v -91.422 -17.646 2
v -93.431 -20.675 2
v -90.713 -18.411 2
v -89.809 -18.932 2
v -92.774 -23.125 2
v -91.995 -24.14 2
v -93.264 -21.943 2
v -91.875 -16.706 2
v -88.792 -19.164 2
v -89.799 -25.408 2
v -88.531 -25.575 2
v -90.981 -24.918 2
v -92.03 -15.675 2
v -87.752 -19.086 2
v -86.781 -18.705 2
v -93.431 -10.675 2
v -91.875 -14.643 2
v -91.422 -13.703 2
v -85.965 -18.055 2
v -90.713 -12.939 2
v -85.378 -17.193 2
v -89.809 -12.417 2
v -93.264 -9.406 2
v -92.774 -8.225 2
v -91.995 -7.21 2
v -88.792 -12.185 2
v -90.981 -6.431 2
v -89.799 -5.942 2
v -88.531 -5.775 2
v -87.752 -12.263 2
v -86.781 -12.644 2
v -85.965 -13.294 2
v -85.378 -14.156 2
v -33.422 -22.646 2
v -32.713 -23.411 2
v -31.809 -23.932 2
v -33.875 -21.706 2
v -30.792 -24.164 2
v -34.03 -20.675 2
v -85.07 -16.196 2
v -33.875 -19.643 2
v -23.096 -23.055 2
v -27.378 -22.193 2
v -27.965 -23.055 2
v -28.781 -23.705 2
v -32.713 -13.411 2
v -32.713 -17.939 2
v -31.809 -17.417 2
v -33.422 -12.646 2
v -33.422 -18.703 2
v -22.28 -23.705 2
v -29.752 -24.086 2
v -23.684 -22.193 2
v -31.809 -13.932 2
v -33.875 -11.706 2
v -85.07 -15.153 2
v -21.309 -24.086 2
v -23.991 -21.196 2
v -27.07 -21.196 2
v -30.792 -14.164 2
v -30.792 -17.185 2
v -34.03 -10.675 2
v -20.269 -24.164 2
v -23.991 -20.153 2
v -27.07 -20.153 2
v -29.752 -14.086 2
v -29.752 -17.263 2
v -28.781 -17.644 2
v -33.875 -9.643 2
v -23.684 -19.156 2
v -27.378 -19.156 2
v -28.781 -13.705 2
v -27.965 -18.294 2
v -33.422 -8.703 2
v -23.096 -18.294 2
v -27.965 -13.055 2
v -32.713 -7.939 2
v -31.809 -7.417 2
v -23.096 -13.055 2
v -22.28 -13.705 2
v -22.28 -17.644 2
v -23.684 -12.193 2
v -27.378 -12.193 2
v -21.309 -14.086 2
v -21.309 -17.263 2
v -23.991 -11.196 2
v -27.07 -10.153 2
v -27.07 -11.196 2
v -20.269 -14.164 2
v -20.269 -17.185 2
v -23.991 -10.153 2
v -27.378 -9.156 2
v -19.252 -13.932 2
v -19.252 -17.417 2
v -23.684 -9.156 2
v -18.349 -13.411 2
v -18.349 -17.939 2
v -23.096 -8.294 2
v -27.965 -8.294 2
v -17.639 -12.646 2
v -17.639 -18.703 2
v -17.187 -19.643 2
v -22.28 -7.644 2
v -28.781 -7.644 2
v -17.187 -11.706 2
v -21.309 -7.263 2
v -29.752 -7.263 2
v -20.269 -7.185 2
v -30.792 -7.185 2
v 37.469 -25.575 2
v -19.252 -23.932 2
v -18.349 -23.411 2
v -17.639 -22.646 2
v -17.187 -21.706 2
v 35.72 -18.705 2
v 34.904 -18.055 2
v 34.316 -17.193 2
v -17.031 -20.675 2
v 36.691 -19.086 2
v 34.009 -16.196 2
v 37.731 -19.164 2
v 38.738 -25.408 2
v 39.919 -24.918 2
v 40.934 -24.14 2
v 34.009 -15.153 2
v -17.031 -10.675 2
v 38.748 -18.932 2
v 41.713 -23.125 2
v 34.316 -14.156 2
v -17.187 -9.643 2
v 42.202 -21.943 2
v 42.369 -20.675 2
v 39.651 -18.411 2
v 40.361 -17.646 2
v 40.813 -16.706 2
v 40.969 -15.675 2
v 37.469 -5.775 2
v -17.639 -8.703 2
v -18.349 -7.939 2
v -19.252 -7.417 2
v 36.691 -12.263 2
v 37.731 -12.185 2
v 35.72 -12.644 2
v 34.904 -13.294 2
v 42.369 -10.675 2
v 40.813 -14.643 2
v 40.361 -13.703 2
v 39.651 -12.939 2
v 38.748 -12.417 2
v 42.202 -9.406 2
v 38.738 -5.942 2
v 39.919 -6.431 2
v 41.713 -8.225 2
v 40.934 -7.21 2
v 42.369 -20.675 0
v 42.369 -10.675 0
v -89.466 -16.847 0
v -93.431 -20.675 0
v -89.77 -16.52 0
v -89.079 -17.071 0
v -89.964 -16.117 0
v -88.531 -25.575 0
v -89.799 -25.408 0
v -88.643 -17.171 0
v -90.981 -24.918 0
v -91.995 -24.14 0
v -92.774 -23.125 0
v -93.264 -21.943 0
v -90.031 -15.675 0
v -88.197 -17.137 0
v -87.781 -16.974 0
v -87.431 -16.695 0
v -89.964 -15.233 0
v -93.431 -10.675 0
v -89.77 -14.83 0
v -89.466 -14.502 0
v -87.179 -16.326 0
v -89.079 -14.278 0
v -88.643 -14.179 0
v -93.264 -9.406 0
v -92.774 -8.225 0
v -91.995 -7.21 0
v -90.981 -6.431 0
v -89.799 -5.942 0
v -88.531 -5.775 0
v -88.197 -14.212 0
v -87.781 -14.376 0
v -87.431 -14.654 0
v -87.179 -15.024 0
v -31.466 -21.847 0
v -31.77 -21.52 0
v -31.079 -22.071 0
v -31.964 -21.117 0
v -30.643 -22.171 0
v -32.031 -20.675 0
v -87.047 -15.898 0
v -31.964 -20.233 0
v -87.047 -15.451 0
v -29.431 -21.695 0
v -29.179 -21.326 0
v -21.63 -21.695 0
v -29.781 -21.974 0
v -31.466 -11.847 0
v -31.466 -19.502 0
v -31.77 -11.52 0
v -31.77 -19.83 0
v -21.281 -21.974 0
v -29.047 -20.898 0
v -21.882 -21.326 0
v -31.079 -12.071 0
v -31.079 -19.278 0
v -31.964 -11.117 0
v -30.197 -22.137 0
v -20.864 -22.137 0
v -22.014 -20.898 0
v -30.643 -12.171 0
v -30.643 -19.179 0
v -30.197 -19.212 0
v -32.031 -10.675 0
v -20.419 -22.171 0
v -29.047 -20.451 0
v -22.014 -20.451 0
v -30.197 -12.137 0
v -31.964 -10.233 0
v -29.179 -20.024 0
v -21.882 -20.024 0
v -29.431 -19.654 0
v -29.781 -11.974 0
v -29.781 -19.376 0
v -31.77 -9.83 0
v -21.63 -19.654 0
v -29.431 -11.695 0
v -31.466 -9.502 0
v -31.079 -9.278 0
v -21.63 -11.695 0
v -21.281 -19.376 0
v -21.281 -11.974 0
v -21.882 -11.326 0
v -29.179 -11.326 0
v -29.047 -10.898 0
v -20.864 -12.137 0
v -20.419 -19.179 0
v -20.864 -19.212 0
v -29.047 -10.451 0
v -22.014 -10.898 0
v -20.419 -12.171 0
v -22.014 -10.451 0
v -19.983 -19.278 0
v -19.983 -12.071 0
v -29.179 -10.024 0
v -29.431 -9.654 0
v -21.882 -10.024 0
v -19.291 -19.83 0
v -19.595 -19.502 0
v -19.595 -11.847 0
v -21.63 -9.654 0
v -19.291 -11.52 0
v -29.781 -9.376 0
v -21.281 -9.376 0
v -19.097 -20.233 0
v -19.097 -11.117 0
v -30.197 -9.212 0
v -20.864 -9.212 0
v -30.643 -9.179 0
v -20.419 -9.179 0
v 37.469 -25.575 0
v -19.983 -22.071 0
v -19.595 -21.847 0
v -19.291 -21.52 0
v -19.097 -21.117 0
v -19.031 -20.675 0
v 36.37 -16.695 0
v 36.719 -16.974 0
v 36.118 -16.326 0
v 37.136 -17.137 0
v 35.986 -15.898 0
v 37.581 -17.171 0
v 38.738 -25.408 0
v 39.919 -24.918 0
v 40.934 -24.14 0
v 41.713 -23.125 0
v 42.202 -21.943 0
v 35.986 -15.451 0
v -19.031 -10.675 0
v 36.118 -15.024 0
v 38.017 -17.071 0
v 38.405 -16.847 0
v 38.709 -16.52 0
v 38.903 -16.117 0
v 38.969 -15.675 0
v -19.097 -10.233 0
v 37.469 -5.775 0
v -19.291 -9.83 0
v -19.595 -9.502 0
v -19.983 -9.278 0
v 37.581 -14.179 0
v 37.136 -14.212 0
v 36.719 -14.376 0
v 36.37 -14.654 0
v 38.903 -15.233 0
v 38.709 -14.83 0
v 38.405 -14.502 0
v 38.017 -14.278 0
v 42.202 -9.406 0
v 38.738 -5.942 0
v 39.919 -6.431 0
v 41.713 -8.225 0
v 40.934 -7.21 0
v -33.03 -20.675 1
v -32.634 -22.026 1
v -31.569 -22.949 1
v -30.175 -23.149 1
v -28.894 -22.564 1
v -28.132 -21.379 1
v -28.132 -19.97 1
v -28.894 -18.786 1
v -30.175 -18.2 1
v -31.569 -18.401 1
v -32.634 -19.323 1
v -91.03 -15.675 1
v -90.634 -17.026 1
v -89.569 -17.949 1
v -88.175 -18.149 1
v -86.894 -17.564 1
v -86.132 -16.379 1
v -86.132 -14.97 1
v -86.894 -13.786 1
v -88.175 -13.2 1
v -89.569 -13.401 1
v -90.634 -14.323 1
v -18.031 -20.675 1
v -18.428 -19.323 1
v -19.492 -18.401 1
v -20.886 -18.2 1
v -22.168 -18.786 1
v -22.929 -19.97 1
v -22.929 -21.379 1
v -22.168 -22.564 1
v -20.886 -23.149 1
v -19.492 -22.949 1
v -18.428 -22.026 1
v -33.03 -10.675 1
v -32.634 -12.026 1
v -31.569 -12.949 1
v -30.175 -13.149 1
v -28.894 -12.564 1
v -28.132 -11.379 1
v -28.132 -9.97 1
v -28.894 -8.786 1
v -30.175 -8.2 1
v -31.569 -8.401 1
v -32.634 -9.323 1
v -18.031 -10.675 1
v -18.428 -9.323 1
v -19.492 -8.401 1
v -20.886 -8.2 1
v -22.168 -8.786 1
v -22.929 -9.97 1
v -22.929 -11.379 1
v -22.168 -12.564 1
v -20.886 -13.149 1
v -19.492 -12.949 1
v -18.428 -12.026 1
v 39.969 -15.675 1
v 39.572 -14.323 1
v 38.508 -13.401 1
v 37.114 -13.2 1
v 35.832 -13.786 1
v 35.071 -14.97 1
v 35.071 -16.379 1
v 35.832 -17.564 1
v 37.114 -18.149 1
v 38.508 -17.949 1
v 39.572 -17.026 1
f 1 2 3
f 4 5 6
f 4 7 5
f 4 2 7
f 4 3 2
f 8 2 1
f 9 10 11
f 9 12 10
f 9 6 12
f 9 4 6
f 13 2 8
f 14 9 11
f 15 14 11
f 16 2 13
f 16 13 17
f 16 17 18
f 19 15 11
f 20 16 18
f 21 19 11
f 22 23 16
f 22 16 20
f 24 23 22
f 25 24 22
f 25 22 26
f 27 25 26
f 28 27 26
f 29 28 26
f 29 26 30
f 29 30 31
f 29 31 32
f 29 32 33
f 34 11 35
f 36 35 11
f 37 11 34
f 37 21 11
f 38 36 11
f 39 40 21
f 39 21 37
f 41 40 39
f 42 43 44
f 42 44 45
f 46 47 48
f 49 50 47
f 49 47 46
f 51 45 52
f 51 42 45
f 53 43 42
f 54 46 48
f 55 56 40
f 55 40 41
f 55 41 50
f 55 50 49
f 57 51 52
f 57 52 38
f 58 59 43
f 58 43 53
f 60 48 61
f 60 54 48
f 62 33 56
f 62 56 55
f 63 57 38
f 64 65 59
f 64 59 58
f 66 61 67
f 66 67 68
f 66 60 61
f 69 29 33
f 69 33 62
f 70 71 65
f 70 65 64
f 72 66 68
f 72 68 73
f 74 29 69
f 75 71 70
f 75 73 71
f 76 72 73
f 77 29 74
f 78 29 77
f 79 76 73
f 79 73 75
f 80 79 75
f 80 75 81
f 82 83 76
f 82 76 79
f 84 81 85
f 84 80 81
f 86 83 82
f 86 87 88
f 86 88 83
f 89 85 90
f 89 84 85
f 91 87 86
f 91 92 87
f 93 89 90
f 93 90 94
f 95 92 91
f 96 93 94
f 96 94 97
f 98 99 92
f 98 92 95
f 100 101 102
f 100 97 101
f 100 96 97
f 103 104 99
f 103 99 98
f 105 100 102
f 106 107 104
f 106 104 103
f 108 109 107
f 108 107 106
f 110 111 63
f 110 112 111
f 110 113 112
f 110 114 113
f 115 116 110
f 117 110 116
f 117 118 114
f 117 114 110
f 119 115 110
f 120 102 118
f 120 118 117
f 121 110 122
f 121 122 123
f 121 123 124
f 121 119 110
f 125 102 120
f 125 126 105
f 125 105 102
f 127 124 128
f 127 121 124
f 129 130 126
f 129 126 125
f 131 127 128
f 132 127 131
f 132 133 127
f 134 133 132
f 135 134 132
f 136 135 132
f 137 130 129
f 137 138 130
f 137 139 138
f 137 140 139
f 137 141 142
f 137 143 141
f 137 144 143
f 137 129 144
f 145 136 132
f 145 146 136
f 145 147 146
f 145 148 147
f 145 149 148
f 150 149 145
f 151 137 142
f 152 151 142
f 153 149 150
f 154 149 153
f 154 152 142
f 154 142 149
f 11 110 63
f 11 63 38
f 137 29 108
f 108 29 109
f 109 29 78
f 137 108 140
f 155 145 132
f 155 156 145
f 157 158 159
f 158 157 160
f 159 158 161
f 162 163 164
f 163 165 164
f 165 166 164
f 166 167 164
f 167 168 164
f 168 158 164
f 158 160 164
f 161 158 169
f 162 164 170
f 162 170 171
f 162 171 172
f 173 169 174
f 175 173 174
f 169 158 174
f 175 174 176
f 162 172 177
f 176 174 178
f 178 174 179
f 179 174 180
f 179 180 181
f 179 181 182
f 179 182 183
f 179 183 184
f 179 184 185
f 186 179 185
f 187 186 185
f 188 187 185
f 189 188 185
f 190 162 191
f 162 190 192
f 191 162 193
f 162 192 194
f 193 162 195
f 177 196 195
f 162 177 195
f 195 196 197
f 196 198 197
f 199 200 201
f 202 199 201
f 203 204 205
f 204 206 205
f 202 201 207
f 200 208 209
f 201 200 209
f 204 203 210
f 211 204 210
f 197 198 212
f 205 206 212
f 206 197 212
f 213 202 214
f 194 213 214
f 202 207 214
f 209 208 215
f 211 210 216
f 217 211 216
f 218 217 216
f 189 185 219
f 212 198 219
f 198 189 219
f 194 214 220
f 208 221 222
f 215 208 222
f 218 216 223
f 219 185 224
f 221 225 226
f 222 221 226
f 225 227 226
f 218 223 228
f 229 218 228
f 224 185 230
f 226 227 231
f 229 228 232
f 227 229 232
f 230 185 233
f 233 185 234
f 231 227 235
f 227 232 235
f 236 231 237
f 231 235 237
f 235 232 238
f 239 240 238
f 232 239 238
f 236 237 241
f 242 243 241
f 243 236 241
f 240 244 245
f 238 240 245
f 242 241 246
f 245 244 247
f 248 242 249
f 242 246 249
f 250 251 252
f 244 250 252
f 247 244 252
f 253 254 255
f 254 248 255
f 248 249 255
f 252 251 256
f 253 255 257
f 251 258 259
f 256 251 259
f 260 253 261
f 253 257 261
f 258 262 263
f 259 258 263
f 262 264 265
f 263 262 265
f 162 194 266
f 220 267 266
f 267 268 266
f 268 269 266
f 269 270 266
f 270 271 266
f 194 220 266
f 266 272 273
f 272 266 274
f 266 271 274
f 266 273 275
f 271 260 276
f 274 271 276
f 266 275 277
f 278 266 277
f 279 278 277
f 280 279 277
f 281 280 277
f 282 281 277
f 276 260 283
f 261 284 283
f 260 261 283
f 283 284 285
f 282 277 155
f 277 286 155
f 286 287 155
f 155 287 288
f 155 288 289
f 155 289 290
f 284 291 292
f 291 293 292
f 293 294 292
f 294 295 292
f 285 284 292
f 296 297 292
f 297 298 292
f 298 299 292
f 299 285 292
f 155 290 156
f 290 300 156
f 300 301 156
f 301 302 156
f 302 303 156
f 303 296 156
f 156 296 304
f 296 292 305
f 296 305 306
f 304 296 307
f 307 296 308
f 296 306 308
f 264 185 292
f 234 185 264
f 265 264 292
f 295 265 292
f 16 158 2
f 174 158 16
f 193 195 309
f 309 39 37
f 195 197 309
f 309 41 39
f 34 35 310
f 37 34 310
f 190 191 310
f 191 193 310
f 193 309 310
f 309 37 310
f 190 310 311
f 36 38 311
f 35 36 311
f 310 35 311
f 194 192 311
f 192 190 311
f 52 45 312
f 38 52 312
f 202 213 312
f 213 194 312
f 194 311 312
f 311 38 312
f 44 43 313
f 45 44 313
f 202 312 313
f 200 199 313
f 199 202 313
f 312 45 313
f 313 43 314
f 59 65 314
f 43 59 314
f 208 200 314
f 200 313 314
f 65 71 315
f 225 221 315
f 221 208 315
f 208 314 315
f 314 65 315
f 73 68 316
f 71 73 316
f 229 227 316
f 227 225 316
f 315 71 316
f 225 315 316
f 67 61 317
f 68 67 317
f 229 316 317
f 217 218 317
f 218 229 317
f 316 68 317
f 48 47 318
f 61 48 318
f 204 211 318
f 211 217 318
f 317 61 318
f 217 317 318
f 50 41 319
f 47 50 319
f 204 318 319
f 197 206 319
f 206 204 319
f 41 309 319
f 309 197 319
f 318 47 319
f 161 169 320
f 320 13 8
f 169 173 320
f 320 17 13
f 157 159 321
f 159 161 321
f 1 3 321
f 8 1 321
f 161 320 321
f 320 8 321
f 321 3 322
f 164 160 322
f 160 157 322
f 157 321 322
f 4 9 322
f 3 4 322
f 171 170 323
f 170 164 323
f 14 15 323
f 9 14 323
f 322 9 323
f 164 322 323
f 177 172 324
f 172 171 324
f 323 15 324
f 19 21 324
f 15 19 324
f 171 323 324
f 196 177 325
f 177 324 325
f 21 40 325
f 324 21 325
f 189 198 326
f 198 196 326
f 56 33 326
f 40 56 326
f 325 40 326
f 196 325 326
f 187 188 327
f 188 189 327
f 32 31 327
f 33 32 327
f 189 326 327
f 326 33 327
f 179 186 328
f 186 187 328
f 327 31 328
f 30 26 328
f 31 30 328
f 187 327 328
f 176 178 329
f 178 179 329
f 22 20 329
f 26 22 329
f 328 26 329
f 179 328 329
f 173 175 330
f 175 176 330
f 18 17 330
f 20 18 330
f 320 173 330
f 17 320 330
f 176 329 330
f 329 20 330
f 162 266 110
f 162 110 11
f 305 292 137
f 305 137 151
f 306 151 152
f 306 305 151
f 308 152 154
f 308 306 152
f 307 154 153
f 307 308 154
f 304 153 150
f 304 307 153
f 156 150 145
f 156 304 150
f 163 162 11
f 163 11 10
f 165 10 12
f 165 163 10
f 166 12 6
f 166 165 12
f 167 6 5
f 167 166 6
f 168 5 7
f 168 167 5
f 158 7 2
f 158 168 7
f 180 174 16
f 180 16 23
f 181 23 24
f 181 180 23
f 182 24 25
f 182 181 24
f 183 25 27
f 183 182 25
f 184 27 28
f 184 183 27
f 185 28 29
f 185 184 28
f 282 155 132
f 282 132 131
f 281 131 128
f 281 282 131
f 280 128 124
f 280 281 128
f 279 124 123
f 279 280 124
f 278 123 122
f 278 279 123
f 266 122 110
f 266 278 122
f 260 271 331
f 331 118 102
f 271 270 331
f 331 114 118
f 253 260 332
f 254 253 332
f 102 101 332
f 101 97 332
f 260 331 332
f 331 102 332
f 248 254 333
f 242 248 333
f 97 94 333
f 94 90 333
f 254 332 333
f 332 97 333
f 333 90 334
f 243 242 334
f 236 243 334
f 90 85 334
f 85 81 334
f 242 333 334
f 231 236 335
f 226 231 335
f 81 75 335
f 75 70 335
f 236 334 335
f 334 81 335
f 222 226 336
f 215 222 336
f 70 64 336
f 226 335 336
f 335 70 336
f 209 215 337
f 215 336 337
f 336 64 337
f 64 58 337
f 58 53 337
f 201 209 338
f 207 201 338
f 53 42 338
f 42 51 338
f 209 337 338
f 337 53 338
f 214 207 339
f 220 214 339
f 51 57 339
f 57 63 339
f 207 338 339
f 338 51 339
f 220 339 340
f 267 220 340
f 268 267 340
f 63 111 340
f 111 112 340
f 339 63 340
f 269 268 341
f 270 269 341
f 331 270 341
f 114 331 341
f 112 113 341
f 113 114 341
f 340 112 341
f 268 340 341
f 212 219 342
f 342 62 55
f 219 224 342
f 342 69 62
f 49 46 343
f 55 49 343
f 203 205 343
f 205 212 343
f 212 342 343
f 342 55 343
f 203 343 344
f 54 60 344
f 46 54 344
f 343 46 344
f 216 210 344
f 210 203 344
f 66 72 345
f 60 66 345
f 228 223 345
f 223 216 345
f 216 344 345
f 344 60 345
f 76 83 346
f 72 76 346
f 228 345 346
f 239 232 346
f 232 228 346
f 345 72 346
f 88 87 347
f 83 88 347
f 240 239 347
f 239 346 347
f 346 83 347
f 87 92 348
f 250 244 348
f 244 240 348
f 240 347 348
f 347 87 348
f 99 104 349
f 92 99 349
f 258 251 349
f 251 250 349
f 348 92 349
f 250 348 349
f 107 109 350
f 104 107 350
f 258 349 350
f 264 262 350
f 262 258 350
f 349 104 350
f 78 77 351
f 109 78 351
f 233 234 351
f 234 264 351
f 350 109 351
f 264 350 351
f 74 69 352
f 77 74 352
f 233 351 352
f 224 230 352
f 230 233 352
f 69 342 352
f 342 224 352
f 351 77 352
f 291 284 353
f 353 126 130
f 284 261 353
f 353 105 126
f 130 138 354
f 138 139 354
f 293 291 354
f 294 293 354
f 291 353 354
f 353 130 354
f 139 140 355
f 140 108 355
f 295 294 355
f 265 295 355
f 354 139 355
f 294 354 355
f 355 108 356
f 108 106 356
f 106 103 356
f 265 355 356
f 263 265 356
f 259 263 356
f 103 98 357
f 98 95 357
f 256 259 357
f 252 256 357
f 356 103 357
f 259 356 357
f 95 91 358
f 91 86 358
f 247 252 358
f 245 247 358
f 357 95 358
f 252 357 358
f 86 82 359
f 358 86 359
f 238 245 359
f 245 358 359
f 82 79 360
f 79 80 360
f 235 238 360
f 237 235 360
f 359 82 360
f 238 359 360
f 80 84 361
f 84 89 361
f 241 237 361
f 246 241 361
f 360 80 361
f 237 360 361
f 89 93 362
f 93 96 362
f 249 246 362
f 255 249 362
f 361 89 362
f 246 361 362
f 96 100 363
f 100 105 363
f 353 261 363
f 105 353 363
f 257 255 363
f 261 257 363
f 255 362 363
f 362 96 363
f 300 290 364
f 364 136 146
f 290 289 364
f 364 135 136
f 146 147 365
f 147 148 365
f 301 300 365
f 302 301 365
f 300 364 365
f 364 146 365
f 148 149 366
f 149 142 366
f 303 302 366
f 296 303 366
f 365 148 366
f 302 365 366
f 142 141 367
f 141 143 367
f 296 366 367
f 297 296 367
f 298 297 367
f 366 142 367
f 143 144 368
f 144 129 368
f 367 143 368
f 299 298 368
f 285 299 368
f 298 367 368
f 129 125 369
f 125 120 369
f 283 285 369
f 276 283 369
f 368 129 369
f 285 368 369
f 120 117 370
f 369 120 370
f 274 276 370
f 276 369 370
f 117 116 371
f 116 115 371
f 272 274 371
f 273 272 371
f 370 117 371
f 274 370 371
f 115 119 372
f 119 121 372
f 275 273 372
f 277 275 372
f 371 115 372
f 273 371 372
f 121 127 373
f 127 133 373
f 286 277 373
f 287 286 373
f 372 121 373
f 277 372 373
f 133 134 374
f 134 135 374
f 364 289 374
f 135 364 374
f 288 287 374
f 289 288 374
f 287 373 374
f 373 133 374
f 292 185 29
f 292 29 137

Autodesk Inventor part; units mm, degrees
ref_plane "YZ Plane" through (0, 0, 0) normal (1, 0, 0) x (0, 1, 0)
ref_plane "XZ Plane" through (0, 0, 0) normal (0, 1, 0) x (-1, 0, 0)
ref_plane "XY Plane" through (0, 0, 0) normal (0, 0, 1) x (1, 0, 0)
sketch "Эскиз1" plane through (0, 0, 0) normal (0, 0, 1) x (1, 0, 0)
  circle A0 centre (37.4694, -15.6747) radius 1.5 projected
  circle A1 centre (-20.5306, -10.6747) radius 1.5 projected
  circle A2 centre (-20.5306, -20.6747) radius 1.5 projected
  arc A3 (37.4694, -25.6747) -> (42.4694, -20.6747) centre (37.4694, -20.6747) ccw projected
  line L0 (42.4694, -10.6747) -> (42.4694, -20.6747) projected
  arc A4 (42.4694, -10.6747) -> (37.4694, -5.6747) centre (37.4694, -10.6747) ccw projected
  line L1 (-25.5306, -5.6747) -> (37.4694, -5.6747) projected
  line L2 (-25.5306, -25.6747) -> (-25.5306, -5.6747) projected
  line L3 (37.4694, -25.6747) -> (-25.5306, -25.6747) projected
  arc A5 (42.3694, -10.6747) -> (37.4694, -5.7747) centre (37.4694, -10.6747) ccw
  line L4 (42.3694, -10.6747) -> (42.3694, -20.6747)
  arc A6 (37.4694, -25.5747) -> (42.3694, -20.6747) centre (37.4694, -20.6747) ccw
  line L5 (37.4694, -25.5747) -> (-25.5306, -25.5747)
  line L6 (-25.5306, -5.7747) -> (37.4694, -5.7747)
  point P0 (0, 0)
  dimension "d0" = 0.1
extrude "Выдавливание1" add sketch "Эскиз1" along normal blind 2 contours L2 L6 A5 L4 A6 L5
chamfer "Фаска1" distance 2 angle 45 3 edges at (35.9694, -15.6747, 2) (-22.0306, -20.6747, 2) (-22.0306, -10.6747, 2)
mirror "Зеркальное отражение1" about plane through (-25.5306, -5.7747, 0) normal (-1, 0, 0)
properties part number "РеброСкрепления"
